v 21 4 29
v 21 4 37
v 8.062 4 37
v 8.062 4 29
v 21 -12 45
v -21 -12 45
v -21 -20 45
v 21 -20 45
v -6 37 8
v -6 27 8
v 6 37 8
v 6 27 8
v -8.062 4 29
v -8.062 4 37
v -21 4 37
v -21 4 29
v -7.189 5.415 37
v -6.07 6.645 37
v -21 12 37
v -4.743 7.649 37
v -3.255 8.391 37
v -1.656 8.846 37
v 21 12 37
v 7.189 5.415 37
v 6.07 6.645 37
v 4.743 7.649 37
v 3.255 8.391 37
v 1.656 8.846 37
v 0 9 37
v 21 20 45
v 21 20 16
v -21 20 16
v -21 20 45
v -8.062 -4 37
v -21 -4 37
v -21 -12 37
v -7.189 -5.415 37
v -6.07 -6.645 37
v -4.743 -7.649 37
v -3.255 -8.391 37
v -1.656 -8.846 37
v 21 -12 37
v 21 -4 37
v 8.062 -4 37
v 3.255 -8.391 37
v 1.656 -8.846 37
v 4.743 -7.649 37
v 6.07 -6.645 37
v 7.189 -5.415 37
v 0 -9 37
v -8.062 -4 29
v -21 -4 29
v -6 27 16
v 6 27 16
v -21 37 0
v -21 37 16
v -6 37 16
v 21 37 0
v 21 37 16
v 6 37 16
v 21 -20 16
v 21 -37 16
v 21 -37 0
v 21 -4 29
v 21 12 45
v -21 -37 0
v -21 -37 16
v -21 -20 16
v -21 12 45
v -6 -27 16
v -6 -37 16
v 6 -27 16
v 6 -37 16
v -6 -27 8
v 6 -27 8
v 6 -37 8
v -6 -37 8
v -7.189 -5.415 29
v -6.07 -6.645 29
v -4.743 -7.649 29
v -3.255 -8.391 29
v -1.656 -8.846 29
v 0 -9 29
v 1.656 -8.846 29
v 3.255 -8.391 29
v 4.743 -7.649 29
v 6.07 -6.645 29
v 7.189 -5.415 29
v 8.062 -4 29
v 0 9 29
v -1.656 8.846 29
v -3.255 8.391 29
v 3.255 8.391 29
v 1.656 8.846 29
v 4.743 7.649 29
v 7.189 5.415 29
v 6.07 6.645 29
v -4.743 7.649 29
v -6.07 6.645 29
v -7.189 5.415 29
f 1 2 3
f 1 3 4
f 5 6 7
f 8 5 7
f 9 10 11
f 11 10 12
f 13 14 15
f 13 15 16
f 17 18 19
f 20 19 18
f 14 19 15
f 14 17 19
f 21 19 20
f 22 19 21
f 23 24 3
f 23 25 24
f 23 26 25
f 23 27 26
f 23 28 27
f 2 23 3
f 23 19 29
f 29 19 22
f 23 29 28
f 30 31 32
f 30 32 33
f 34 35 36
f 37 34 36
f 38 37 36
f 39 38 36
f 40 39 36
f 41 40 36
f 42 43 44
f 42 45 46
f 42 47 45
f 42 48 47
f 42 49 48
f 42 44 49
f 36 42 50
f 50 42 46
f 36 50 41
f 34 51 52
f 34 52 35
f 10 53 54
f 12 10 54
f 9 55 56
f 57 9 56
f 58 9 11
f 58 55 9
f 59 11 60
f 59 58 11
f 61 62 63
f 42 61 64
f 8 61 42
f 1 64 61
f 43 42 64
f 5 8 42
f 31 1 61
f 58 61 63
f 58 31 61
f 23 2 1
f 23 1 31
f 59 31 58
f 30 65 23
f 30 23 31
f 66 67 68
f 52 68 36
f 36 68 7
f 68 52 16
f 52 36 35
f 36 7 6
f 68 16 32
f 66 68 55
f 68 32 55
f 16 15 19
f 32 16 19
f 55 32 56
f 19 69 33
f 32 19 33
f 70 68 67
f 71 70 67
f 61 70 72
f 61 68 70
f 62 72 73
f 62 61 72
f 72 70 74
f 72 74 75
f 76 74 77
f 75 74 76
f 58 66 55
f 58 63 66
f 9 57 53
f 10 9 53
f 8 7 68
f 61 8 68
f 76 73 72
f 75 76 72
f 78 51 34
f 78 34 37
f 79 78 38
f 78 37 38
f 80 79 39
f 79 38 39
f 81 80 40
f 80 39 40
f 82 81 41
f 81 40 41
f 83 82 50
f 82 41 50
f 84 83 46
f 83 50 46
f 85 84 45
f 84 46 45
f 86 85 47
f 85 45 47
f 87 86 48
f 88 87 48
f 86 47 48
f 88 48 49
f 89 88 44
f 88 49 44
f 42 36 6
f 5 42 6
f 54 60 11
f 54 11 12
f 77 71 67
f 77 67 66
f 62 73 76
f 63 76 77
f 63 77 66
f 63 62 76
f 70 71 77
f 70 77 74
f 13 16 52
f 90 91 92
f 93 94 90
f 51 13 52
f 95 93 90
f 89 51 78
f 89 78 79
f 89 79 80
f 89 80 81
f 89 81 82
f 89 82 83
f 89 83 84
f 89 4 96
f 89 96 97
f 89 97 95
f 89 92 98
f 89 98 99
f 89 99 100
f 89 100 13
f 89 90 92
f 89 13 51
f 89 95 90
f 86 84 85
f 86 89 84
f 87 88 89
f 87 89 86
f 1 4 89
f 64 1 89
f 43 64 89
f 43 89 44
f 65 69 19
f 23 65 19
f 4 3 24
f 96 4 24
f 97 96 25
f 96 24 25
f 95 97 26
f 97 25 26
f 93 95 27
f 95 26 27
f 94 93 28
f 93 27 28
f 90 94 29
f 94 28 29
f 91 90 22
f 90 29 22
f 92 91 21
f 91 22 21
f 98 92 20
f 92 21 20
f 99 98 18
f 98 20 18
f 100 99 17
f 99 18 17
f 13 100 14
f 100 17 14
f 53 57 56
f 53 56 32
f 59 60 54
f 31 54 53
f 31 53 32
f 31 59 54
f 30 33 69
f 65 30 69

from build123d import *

# Parameters (mm, degrees)
F1_DEPTH = 21
F2_R     = 9
F3_DEPTH = 8
F4_W     = 12
F4_H     = 10
F5_DEPTH = 8


# Not quite as in the source:
# - a pattern or mirror of a feature is missing from the dataset's text; its kind, count and spacing are read off the source's solid


with BuildPart() as f1:
    # F0 (on Right) → F1 (new body, symmetric)
    with BuildSketch(Plane.YZ):
        Polygon((-37, 0), (0, 0), (37, 0), (37, 16), (20, 16), (20, 45), (12, 45), (12, 37), (4, 37), (4, 29), (0, 29), (-4, 29), (-4, 37), (-12, 37), (-12, 45), (-20, 45), (-20, 16), (-37, 16), align=None)
    extrude(amount=F1_DEPTH, both=True)

    # F2 (on face) → F3 (cut, through all)
    with BuildSketch(Plane.XY.offset(37)):
        Circle(F2_R)
    extrude(amount=-F3_DEPTH, mode=Mode.SUBTRACT)

    # F4 (on face) → F5 (cut)
    with BuildSketch(Plane.XY.offset(16)):
        with Locations((0, -32)):
            Rectangle(F4_W, F4_H)
    f5 = extrude(amount=-F5_DEPTH, mode=Mode.SUBTRACT)

    # F5_copies: F5 across plane
    add(f5.mirror(Plane.ZX), mode=Mode.SUBTRACT)


solid = f1.part
